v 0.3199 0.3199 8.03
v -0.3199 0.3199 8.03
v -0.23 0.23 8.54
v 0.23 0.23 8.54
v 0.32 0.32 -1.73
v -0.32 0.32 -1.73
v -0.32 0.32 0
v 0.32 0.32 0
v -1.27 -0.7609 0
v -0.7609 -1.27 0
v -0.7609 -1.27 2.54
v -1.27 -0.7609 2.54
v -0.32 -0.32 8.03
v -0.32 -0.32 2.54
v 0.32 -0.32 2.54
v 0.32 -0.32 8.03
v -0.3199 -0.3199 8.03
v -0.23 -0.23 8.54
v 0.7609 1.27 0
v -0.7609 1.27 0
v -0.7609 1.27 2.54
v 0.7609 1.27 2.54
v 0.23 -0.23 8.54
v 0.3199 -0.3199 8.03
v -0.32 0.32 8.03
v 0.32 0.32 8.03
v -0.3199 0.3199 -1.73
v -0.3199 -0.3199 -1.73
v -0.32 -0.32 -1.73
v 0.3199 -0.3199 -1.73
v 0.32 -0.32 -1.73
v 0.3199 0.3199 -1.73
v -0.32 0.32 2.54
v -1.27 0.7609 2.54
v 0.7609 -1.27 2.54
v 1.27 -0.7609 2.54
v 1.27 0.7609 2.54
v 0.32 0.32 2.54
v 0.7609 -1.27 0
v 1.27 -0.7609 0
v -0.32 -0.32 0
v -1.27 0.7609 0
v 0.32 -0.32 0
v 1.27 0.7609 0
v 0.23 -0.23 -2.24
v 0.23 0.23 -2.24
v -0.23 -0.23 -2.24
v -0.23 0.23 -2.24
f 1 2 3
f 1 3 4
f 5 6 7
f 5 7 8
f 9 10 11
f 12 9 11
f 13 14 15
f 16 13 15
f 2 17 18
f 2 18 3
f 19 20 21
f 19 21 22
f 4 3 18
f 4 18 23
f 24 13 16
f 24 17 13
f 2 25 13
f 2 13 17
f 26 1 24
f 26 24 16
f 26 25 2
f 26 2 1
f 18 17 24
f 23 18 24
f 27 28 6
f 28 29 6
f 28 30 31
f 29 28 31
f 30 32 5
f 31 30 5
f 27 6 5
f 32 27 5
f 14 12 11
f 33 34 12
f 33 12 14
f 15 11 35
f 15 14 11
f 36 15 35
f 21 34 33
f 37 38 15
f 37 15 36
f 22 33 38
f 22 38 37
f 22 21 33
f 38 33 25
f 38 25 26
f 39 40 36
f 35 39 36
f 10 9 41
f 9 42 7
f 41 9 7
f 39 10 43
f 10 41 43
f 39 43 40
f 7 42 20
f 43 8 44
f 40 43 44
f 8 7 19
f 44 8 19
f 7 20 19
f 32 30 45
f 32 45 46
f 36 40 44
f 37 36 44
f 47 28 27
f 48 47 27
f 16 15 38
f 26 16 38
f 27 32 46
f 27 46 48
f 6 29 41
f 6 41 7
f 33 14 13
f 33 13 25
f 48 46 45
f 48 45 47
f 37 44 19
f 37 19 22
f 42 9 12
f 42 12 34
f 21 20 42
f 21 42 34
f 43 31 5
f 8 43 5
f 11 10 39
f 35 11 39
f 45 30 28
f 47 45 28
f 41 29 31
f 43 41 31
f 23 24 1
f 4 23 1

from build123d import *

# Parameters (mm, degrees)
SKETCH_1_W           = 2.54
SKETCH_1_H           = 2.54
EXTRUDE_1_DEPTH      = 2.54
EXTRUDE_2_DEPTH      = 8.03
EXTRUDE_2_DEPTH_BACK = 1.73
SKETCH_2_W           = 0.64
SKETCH_2_H           = 0.64
SKETCH_3_W           = 0.46
SKETCH_3_H           = 0.46
EXTRUDE_3_DEPTH      = 0.51
SKETCH_4_W           = 0.46
SKETCH_4_H           = 0.46
EXTRUDE_4_DEPTH      = 0.51
DRAFT_2_ANGLE        = 10
DRAFT_3_ANGLE        = 10
CHAMFER_1_SIZE       = 0.509116882


with BuildPart() as part:
    # ｽｹｯﾁ1 → ﾎﾞｽ - 押し出し1 (new body)
    with BuildSketch(Plane.XY):
        Rectangle(SKETCH_1_W, SKETCH_1_H)
    extrude(amount=EXTRUDE_1_DEPTH)

    # ｽｹｯﾁ2 → ﾎﾞｽ - 押し出し2 (add, two sides: drawn at the far end of the back side and taken through both)
    with BuildSketch(Plane.XY.offset(-EXTRUDE_2_DEPTH_BACK)):
        Rectangle(SKETCH_2_W, SKETCH_2_H)
    extrude(amount=EXTRUDE_2_DEPTH + EXTRUDE_2_DEPTH_BACK)

    # ｽｹｯﾁ3 → ﾎﾞｽ - 押し出し3 (add)
    with BuildSketch(Plane(origin=(0, 0, -1.73), x_dir=(-1, 0, 0), z_dir=(0, 0, -1))):
        Rectangle(SKETCH_3_W, SKETCH_3_H)
    extrude(amount=EXTRUDE_3_DEPTH)

    # ｽｹｯﾁ4 → ﾎﾞｽ - 押し出し4 (add)
    with BuildSketch(Plane.XY.offset(8.03)):
        Rectangle(SKETCH_4_W, SKETCH_4_H)
    extrude(amount=EXTRUDE_4_DEPTH)

    # 抜き勾配2
    draft_2_faces = [part.faces().sort_by_distance(p)[0] for p in [
        (0, -0.23, 8.285),
        (-0.23, 0, 8.285),
        (0, 0.23, 8.285),
        (0.23, 0, 8.285),
    ]]
    draft(draft_2_faces, Plane.XY.offset(8.54), DRAFT_2_ANGLE)

    # 抜き勾配3
    draft_3_faces = [part.faces().sort_by_distance(p)[0] for p in [
        (-0.23, 0, -1.985),
        (0, -0.23, -1.985),
        (0.23, 0, -1.985),
        (0, 0.23, -1.985),
    ]]
    draft(draft_3_faces, Plane(origin=(0, 0, -2.24), x_dir=(-1, 0, 0), z_dir=(0, 0, -1)), DRAFT_3_ANGLE)

    # 面取り1
    chamfer_1_edges = [part.edges().sort_by_distance(p)[0] for p in [
        (1.27, -1.27, 1.27),
        (-1.27, -1.27, 1.27),
        (-1.27, 1.27, 1.27),
        (1.27, 1.27, 1.27),
    ]]
    chamfer(chamfer_1_edges, length=CHAMFER_1_SIZE)


solid = part.part
